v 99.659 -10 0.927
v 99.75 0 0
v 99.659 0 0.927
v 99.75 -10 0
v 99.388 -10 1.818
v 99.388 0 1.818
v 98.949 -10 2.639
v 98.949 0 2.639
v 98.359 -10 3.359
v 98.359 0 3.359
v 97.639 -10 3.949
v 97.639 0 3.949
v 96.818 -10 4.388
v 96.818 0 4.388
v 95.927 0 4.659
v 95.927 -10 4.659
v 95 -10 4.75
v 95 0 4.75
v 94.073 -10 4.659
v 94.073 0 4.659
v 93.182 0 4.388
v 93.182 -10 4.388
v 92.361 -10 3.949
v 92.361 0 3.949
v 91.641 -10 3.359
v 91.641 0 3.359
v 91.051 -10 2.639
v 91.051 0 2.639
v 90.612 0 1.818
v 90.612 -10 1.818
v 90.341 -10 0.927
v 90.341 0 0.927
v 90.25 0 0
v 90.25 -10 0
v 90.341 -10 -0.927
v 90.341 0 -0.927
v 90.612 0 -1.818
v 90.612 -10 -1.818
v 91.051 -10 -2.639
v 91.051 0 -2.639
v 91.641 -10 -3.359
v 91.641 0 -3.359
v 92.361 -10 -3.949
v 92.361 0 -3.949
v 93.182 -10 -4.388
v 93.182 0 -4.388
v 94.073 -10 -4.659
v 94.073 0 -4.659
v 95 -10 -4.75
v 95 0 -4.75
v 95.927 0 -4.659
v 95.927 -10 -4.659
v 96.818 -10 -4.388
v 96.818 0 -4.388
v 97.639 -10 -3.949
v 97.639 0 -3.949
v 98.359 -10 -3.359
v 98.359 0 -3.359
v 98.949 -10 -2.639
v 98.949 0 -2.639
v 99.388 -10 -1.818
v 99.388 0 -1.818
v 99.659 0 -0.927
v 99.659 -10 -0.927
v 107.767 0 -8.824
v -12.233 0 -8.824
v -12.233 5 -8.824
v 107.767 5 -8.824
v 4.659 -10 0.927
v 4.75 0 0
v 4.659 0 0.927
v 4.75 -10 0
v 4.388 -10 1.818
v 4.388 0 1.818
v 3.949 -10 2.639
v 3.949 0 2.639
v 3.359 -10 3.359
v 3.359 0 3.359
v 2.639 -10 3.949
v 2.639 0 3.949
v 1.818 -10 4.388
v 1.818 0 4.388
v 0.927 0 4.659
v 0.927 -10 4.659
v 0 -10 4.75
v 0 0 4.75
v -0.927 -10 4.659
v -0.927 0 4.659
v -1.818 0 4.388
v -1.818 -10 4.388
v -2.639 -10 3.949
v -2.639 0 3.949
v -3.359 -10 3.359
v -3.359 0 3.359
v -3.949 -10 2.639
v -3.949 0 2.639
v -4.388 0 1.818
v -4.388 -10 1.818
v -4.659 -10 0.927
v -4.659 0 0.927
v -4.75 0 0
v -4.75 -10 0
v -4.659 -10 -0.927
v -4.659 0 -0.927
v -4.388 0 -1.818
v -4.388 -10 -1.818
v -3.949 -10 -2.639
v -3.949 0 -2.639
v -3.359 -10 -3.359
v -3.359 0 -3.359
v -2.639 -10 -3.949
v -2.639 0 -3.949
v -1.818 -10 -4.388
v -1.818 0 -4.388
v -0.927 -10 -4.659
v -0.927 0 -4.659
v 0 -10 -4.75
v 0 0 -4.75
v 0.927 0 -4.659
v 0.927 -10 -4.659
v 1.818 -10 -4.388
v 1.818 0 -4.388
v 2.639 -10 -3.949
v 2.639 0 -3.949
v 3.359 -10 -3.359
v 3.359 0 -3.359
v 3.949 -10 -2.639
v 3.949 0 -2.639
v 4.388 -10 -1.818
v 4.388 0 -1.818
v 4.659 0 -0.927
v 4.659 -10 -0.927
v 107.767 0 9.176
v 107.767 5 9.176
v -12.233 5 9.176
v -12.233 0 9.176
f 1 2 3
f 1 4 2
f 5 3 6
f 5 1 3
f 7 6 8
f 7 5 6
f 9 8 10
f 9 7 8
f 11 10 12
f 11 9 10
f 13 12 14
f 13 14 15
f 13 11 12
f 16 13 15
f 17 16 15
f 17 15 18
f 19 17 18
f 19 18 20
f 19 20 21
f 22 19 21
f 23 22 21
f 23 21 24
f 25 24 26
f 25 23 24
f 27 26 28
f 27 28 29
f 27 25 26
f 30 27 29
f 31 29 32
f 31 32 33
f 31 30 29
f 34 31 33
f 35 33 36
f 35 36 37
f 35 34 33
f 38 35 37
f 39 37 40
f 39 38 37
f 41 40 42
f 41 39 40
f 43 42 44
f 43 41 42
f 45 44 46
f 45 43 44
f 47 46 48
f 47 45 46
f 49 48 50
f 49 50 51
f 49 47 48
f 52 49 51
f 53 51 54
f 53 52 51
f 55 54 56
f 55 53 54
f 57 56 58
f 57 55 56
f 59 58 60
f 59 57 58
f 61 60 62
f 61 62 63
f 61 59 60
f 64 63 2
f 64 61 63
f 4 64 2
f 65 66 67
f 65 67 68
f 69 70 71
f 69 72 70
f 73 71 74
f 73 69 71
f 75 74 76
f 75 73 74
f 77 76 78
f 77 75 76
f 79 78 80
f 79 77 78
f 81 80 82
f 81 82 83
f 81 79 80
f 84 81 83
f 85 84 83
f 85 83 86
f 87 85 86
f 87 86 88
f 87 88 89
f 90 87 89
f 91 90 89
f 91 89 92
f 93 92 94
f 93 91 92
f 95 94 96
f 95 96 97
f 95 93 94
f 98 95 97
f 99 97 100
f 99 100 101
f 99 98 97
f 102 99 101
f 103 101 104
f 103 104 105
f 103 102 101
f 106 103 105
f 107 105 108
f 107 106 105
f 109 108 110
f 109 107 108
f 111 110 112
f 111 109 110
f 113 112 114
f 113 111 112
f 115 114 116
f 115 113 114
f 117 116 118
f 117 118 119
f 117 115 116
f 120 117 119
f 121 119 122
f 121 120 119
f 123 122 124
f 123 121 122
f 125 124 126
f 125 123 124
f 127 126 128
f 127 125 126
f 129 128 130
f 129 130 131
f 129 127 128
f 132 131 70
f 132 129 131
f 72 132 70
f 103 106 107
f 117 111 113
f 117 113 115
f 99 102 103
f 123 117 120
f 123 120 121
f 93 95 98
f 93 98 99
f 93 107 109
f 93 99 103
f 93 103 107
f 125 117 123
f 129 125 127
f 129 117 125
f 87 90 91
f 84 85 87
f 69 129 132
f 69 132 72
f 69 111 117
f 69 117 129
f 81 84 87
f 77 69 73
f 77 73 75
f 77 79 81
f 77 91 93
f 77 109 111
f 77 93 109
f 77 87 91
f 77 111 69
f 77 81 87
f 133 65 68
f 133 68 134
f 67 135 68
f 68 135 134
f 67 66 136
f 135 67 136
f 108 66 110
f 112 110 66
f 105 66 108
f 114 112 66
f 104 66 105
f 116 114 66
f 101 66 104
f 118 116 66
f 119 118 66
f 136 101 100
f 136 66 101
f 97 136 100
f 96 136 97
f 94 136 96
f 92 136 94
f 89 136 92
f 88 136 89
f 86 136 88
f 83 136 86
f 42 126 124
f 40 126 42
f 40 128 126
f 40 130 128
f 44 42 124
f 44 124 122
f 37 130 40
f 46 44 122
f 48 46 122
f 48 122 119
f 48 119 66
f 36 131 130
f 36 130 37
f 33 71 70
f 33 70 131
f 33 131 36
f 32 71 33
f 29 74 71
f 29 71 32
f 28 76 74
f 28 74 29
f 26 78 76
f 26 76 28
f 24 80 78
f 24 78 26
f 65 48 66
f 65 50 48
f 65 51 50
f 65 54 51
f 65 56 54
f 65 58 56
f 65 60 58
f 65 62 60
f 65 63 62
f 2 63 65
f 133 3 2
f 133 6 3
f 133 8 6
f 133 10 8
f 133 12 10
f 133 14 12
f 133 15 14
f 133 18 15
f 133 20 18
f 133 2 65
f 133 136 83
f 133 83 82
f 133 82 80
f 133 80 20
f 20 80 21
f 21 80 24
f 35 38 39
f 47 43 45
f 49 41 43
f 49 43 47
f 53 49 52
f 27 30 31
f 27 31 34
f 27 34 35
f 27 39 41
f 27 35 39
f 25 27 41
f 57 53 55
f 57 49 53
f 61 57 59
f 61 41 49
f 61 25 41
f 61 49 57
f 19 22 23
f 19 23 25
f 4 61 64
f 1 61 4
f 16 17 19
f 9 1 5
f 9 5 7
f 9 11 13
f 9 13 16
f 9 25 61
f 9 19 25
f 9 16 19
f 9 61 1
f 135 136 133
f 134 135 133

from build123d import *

# Parameters (mm, degrees)
F0_R          = 4.75
F1_DEPTH      = 10
F1_DEPTH_BACK = 5
F0_W          = 120
F0_H          = 18
F2_DEPTH      = 5


with BuildPart() as f1:
    # F0 (on Front) → F1 (new body, two sides)
    with BuildSketch(Plane.XZ) as f1_sk:
        Circle(F0_R)
    extrude(amount=F1_DEPTH)
    extrude(f1_sk.sketch, amount=-F1_DEPTH_BACK)



with BuildPart() as f1b:
    # F0 (on Front) → F1, piece 2 (new body, two sides)
    with BuildSketch(Plane.XZ) as f1_2_sk:
        with Locations((95, 0)):
            Circle(F0_R)
    extrude(amount=F1_DEPTH)
    extrude(f1_2_sk.sketch, amount=-F1_DEPTH_BACK)


with BuildPart() as f1_1:
    add(f1.part)

    add(f1b.part)  # F2 merges F1b
    # F0 (on Front) → F2 (join)
    with BuildSketch(Plane.XZ):
        with Locations((47.7674523741, 0.1763370037)):
            Rectangle(F0_W, F0_H)
        Circle(F0_R, mode=Mode.SUBTRACT)
        with Locations((95, 0)):
            Circle(F0_R, mode=Mode.SUBTRACT)
    extrude(amount=-F2_DEPTH)


solid = f1_1.part
